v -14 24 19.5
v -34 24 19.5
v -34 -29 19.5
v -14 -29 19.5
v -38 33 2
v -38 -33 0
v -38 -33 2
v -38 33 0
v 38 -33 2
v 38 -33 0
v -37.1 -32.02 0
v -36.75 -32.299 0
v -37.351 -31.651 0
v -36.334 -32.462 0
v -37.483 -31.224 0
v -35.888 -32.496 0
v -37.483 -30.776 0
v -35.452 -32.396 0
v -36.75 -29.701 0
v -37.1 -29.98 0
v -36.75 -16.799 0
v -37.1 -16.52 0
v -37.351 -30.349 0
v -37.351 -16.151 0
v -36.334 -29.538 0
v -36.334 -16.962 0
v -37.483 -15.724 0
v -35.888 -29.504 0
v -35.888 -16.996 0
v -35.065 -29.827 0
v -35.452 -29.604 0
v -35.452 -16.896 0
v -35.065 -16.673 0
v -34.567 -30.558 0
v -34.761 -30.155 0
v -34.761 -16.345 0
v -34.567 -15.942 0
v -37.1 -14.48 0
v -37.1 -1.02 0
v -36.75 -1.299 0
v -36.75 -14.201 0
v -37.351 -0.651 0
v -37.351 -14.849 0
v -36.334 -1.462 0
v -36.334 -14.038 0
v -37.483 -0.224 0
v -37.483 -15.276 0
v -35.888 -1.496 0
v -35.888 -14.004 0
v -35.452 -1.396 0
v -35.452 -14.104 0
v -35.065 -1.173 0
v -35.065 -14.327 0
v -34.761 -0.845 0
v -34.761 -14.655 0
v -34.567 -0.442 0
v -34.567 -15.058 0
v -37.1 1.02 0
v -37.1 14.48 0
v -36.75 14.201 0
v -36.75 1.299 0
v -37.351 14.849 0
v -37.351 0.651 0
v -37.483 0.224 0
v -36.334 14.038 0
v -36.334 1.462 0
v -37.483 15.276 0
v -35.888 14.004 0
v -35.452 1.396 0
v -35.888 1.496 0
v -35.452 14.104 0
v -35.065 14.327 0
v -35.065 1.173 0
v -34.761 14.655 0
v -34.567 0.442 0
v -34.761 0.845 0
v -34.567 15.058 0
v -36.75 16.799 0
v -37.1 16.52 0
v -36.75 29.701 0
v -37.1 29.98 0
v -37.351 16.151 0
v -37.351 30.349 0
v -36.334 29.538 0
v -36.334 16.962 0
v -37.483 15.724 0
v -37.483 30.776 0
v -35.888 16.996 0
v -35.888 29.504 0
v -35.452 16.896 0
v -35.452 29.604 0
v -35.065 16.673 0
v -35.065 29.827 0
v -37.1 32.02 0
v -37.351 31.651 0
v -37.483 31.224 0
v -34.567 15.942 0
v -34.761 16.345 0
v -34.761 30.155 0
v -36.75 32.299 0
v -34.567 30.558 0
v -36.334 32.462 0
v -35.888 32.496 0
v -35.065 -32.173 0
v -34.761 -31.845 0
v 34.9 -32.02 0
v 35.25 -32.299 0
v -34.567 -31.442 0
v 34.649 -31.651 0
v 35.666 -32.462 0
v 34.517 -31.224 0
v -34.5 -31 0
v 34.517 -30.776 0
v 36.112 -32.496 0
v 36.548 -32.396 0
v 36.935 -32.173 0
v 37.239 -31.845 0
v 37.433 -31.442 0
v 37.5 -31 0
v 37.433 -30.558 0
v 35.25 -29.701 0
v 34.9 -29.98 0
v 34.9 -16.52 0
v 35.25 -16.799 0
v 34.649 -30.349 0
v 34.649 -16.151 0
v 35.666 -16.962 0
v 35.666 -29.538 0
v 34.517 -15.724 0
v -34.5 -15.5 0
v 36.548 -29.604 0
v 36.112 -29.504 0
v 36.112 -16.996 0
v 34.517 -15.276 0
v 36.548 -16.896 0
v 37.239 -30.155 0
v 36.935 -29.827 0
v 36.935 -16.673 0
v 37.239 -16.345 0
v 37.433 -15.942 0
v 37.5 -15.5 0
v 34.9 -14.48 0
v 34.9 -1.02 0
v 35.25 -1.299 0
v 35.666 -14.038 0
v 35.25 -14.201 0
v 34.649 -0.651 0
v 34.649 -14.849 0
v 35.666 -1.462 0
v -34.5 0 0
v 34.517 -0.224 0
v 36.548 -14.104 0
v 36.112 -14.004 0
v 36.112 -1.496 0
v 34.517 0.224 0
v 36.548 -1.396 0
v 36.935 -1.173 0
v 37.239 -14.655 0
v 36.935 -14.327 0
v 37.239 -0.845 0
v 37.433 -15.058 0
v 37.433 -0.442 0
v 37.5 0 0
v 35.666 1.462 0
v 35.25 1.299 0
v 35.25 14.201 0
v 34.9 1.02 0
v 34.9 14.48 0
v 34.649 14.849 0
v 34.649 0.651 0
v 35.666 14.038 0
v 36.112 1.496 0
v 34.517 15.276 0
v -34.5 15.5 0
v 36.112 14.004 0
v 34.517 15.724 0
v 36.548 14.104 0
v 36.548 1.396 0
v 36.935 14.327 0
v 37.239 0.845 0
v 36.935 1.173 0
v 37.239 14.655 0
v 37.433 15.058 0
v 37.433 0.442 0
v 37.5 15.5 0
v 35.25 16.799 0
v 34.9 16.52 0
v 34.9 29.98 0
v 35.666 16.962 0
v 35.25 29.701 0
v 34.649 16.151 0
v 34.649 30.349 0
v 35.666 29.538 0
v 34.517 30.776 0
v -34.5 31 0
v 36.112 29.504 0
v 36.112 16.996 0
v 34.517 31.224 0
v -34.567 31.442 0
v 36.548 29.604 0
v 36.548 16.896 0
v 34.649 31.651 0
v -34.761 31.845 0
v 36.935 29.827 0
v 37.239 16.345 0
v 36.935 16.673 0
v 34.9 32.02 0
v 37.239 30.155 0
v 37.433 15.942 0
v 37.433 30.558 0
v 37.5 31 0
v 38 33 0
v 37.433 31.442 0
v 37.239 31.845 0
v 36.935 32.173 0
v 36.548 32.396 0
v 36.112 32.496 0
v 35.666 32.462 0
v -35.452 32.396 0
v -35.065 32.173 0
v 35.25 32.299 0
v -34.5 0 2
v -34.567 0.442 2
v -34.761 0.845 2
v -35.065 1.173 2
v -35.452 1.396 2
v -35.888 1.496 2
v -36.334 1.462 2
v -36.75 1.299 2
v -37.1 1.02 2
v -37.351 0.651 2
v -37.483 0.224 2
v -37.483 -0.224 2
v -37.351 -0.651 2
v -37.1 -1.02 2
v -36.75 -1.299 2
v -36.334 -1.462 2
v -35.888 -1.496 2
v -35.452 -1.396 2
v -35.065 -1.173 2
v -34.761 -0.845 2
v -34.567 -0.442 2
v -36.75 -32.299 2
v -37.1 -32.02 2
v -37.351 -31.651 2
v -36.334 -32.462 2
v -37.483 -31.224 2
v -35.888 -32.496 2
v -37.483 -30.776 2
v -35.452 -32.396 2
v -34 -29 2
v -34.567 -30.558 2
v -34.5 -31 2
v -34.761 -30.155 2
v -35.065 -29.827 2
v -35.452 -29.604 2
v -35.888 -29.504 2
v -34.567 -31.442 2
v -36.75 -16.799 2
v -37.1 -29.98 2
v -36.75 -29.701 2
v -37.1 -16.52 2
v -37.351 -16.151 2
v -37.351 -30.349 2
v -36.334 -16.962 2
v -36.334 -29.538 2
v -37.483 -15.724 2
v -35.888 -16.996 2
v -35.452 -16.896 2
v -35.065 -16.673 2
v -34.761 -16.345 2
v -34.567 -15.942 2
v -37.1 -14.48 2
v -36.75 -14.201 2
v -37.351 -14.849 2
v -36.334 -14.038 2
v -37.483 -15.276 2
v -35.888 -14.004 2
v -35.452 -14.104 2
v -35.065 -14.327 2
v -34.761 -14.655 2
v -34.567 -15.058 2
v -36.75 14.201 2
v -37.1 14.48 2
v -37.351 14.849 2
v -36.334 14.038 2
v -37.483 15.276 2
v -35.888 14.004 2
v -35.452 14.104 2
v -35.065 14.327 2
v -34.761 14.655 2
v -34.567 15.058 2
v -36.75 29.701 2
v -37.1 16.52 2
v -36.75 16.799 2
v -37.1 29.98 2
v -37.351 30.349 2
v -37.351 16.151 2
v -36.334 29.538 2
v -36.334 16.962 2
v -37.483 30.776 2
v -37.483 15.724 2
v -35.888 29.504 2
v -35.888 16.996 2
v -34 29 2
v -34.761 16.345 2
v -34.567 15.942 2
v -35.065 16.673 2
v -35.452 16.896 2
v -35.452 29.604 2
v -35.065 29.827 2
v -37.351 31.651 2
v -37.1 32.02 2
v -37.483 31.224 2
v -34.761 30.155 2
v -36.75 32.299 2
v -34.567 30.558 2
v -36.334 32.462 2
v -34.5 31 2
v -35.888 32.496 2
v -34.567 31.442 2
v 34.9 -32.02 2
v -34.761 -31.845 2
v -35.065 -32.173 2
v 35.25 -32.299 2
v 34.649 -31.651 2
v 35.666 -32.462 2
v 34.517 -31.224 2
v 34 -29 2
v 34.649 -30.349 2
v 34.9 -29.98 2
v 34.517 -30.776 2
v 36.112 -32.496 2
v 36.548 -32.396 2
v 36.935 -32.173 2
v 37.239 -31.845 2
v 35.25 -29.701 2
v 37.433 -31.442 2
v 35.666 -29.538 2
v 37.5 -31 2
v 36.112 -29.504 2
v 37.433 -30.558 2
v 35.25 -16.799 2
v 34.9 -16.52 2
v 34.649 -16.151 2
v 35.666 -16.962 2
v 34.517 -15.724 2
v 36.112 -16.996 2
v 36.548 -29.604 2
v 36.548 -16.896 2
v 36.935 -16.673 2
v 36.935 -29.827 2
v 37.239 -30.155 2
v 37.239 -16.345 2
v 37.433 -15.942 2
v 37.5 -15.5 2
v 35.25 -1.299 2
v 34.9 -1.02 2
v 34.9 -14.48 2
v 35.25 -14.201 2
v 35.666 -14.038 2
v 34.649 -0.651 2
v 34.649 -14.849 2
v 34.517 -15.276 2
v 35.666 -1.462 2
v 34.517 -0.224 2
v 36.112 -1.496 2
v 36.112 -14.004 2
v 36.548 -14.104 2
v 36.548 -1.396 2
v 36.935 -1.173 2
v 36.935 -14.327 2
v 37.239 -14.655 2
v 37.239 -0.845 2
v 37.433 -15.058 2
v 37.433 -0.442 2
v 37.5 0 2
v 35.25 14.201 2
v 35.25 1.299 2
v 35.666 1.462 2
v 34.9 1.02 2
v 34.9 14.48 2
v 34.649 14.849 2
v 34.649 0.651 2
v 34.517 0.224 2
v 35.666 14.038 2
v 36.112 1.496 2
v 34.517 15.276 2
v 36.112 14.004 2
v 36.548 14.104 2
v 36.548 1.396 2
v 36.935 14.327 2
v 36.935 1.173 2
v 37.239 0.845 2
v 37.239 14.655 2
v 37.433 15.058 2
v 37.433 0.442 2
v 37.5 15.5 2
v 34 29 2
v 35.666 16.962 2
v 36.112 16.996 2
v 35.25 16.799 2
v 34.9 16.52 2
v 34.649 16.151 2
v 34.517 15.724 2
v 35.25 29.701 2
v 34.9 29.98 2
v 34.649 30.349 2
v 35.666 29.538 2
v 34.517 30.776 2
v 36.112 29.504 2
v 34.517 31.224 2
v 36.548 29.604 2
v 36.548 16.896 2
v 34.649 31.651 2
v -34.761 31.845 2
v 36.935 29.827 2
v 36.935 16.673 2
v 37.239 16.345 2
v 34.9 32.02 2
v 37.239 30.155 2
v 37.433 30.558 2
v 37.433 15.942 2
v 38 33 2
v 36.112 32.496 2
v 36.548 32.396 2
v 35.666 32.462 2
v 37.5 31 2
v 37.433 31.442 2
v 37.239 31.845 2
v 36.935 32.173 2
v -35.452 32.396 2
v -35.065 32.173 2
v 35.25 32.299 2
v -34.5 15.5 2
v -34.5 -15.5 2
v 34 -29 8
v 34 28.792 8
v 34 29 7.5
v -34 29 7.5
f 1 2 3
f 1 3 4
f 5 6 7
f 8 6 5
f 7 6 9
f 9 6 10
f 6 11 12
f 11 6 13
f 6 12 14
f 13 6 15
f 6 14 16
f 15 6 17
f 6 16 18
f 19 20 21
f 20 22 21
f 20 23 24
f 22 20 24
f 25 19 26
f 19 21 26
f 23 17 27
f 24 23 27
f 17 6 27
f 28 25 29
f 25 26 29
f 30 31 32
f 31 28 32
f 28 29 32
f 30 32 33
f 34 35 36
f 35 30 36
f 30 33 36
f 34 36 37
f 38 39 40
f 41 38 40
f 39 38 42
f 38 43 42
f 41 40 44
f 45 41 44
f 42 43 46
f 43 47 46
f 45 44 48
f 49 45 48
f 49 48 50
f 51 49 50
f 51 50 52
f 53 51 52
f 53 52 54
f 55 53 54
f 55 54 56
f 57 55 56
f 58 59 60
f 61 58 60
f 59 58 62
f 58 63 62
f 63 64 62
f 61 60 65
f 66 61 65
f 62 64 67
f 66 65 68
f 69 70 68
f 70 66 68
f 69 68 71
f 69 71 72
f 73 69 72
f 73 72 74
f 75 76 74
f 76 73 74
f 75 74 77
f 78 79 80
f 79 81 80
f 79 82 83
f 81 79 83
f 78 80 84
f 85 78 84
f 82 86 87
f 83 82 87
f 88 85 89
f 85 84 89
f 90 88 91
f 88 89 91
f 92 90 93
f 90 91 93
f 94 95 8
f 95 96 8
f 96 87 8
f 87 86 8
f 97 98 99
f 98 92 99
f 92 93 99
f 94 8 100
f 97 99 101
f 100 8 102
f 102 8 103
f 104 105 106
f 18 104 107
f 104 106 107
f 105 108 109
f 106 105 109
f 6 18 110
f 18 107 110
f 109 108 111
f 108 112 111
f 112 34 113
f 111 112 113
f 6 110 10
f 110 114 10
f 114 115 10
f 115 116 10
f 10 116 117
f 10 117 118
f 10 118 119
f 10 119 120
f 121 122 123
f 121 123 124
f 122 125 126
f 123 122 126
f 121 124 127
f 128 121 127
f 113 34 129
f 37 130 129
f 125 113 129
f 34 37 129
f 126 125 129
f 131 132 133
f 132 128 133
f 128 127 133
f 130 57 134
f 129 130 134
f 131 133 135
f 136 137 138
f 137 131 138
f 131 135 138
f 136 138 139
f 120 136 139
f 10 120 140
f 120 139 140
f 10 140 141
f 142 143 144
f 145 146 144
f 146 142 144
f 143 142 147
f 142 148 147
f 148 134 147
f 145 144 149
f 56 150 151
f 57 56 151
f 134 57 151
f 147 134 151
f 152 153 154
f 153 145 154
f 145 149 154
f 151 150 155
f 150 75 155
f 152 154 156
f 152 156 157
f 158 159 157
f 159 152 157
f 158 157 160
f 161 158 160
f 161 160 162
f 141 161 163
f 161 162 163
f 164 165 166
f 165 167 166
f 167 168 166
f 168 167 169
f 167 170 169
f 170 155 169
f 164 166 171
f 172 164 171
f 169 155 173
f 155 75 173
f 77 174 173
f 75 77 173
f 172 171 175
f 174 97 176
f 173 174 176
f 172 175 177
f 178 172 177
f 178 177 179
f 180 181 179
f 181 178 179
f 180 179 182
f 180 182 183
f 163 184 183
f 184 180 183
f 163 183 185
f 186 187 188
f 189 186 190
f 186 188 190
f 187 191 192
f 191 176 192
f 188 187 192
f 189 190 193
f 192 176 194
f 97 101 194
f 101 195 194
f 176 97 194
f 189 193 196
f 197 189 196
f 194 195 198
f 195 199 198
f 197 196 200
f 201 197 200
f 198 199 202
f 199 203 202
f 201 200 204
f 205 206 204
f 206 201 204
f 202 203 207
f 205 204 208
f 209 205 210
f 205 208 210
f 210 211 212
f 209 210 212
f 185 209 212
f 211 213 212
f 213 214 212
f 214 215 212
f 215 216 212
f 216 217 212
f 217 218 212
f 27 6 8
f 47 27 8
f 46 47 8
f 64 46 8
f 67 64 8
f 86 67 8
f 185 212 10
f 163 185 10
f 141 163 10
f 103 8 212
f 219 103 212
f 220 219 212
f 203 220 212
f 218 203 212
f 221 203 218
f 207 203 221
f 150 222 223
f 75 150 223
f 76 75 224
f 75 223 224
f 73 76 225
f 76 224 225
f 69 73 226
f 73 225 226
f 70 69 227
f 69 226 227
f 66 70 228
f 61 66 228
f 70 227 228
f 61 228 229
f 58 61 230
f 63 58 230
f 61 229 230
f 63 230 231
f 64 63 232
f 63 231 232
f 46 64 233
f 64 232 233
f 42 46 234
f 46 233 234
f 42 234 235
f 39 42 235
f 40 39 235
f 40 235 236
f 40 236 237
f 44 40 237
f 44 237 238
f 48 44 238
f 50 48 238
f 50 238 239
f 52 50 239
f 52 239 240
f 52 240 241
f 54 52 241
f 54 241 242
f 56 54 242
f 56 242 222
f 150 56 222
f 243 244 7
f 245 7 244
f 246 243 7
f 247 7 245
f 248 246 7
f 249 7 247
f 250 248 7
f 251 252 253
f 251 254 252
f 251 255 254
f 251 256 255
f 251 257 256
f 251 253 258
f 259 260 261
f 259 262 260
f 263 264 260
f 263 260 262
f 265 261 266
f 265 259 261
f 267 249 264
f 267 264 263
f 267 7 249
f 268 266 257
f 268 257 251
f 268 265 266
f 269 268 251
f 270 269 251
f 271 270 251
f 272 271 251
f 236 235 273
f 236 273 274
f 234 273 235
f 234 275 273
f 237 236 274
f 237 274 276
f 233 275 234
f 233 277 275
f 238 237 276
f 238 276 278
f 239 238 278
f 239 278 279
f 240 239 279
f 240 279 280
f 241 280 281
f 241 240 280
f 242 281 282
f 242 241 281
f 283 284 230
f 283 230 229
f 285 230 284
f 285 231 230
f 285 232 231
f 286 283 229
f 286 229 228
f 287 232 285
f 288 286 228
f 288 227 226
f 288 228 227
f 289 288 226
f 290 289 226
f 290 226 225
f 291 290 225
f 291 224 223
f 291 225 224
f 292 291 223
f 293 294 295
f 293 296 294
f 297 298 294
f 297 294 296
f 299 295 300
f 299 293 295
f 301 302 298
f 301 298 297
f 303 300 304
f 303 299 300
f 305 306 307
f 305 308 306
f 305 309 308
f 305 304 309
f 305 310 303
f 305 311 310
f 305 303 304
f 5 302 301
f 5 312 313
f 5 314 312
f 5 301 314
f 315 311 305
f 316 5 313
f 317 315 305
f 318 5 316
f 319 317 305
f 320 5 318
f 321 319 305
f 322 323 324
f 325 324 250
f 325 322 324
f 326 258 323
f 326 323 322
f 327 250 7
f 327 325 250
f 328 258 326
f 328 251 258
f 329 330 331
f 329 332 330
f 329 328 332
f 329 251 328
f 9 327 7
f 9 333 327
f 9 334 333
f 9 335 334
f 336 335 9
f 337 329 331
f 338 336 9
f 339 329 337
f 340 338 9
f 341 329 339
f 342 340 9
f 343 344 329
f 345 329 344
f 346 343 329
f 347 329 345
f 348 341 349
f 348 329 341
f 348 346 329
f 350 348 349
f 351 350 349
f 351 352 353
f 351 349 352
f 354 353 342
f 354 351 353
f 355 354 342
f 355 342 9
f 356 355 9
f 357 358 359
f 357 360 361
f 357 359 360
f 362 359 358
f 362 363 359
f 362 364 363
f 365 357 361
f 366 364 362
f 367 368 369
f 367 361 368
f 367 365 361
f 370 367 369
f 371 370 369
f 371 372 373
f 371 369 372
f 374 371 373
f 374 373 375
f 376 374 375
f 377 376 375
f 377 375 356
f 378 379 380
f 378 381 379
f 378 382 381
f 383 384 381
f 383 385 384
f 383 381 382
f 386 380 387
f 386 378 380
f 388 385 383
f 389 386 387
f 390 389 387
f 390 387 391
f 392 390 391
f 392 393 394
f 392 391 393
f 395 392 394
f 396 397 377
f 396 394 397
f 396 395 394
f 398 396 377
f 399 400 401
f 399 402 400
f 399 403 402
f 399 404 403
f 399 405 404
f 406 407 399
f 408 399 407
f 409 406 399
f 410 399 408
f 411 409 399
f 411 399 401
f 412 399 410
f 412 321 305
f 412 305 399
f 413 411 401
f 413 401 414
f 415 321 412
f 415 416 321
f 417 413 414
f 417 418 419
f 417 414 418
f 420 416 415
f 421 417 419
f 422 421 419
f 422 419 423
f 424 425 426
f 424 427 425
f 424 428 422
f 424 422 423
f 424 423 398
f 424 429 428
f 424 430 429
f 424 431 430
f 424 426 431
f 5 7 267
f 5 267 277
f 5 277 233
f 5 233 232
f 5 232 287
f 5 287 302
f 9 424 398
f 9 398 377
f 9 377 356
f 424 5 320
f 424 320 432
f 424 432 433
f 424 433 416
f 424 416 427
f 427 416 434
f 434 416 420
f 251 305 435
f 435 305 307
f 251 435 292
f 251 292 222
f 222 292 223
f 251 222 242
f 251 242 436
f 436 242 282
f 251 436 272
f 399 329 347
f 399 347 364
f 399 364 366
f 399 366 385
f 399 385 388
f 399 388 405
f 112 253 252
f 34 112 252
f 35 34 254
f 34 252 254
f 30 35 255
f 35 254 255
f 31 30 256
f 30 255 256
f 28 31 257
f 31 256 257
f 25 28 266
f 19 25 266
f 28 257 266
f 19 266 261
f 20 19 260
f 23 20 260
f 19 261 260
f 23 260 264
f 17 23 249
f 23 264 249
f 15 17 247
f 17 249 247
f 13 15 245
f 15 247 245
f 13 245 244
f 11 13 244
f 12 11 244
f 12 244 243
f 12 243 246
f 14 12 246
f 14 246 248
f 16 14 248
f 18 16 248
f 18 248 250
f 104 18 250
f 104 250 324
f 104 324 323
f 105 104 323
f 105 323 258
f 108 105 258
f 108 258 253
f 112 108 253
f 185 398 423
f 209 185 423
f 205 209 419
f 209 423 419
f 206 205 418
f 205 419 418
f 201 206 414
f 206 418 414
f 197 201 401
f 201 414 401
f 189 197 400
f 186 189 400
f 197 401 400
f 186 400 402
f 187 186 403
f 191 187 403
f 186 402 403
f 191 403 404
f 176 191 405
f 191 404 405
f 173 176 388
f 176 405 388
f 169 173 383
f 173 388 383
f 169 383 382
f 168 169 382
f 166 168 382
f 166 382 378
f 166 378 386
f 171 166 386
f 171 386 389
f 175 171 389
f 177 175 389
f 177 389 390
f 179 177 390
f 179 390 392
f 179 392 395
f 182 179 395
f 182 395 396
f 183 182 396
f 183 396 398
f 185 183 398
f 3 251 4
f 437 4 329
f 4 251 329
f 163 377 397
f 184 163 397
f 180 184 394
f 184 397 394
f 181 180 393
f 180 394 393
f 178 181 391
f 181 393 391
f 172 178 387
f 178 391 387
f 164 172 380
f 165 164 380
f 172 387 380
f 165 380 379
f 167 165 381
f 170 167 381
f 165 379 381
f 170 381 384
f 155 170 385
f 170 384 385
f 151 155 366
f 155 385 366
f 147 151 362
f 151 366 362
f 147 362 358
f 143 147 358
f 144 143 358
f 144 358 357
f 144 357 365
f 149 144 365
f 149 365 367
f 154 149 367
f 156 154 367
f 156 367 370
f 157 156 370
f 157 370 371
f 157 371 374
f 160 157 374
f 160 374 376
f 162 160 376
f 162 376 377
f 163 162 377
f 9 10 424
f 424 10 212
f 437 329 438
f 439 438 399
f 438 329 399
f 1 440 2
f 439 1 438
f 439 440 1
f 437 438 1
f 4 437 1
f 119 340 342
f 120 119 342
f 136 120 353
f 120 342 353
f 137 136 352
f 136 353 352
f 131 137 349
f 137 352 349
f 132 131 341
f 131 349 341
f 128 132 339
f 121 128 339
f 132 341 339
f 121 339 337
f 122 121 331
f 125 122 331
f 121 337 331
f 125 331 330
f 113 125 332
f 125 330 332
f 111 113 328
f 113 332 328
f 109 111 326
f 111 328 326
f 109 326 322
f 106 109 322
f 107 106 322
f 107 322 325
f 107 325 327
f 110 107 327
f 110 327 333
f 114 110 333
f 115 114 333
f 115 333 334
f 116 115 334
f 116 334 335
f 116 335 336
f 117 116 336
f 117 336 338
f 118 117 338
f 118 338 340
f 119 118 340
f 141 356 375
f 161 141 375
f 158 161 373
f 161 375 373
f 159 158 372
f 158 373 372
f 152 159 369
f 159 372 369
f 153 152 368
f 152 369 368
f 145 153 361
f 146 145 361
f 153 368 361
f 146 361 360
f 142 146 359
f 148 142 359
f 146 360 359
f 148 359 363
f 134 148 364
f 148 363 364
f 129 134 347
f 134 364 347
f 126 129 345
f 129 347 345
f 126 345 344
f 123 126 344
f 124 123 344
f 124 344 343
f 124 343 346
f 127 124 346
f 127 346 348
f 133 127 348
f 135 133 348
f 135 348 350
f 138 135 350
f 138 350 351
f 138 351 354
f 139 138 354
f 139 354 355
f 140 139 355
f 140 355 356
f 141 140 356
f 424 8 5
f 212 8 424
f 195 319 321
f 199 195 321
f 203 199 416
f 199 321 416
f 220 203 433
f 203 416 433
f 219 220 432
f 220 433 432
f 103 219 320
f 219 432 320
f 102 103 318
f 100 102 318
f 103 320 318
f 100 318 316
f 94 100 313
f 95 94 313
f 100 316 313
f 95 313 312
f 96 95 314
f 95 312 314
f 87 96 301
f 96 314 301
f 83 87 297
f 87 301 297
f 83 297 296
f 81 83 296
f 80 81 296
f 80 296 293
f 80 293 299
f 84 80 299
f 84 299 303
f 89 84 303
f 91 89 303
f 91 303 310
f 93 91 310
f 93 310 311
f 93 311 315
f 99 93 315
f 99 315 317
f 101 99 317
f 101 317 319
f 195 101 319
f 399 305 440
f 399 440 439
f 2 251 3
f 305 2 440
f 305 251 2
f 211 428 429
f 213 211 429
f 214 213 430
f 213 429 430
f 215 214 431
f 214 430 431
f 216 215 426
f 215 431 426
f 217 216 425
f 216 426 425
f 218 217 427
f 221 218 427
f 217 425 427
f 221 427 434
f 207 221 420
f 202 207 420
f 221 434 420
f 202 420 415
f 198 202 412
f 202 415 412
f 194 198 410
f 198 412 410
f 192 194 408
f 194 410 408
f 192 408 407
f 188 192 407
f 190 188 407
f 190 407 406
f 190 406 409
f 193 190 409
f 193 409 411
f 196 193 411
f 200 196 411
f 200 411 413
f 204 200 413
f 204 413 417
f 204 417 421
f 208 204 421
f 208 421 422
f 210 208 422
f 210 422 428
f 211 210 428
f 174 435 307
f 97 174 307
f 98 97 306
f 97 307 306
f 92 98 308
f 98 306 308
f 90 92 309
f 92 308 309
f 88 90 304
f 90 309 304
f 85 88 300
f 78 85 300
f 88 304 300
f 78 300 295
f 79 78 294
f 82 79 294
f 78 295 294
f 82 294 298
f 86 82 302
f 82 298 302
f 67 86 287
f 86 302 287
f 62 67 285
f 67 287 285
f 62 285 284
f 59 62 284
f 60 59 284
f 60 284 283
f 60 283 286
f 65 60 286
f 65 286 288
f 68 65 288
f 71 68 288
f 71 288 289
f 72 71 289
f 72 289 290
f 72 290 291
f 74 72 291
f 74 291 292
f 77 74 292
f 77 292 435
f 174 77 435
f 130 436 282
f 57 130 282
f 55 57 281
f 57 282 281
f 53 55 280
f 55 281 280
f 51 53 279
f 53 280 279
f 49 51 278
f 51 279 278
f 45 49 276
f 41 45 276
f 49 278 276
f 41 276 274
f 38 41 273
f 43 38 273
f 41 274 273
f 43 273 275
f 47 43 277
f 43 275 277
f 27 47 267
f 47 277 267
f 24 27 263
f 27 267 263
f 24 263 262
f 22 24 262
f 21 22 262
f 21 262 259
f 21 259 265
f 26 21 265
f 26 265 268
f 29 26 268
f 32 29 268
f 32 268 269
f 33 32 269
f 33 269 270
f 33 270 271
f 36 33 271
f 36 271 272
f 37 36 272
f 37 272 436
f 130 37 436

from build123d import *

# Parameters (mm, degrees)
F0_W     = 76
F0_H     = 66
F1_DEPTH = 2
F2_W     = 68
F2_H     = 58
F3_DEPTH = 17.5
F5_DEPTH = 75
F6_SIZE2 = 12
F6_SIZE  = 5
F7_R     = 1.5
F8_DEPTH = 25


with BuildPart() as f1:
    # F0 (on Top) → F1 (new body)
    with BuildSketch(Plane.XY):
        Rectangle(F0_W, F0_H)
    extrude(amount=F1_DEPTH)

    # F2 (on face) → F3 (join)
    with BuildSketch(Plane.XY.offset(2)):
        Rectangle(F2_W, F2_H)
    extrude(amount=F3_DEPTH)

    # F4 (on face) → F5 (cut)
    with BuildSketch(Plane(origin=(0, 29, 0), x_dir=(-1, 0, 0), z_dir=(0, 1, 0))):
        Polygon((14, 19.5), (-34, 19.5), (-34, 8), align=None)
    extrude(amount=-F5_DEPTH, mode=Mode.SUBTRACT)

    # F6
    f6_edges = [f1.edges().sort_by_distance(p)[0] for p in [
        (-24, 29, 19.5),
    ]]
    f6_side = f1.faces().sort_by_distance((-24, 0, 19.5))[0]
    chamfer(f6_edges, length=F6_SIZE, length2=F6_SIZE2, reference=f6_side)

    # F7 (on face) → F8 (cut)
    with BuildSketch(Plane.XY.offset(2)):
        with Locations((-36, 31)):
            Circle(F7_R)
        with Locations((-36, 0)):
            Circle(F7_R)
        with Locations((-36, -31)):
            Circle(F7_R)
        with Locations((36, 31)):
            Circle(F7_R)
        with Locations((36, 0)):
            Circle(F7_R)
        with Locations((36, -31)):
            Circle(F7_R)
        with Locations((-36, 15.5)):
            Circle(F7_R)
        with Locations((-36, -15.5)):
            Circle(F7_R)
        with Locations((36, 15.5)):
            Circle(F7_R)
        with Locations((36, -15.5)):
            Circle(F7_R)
    extrude(amount=-F8_DEPTH, mode=Mode.SUBTRACT)


solid = f1.part
